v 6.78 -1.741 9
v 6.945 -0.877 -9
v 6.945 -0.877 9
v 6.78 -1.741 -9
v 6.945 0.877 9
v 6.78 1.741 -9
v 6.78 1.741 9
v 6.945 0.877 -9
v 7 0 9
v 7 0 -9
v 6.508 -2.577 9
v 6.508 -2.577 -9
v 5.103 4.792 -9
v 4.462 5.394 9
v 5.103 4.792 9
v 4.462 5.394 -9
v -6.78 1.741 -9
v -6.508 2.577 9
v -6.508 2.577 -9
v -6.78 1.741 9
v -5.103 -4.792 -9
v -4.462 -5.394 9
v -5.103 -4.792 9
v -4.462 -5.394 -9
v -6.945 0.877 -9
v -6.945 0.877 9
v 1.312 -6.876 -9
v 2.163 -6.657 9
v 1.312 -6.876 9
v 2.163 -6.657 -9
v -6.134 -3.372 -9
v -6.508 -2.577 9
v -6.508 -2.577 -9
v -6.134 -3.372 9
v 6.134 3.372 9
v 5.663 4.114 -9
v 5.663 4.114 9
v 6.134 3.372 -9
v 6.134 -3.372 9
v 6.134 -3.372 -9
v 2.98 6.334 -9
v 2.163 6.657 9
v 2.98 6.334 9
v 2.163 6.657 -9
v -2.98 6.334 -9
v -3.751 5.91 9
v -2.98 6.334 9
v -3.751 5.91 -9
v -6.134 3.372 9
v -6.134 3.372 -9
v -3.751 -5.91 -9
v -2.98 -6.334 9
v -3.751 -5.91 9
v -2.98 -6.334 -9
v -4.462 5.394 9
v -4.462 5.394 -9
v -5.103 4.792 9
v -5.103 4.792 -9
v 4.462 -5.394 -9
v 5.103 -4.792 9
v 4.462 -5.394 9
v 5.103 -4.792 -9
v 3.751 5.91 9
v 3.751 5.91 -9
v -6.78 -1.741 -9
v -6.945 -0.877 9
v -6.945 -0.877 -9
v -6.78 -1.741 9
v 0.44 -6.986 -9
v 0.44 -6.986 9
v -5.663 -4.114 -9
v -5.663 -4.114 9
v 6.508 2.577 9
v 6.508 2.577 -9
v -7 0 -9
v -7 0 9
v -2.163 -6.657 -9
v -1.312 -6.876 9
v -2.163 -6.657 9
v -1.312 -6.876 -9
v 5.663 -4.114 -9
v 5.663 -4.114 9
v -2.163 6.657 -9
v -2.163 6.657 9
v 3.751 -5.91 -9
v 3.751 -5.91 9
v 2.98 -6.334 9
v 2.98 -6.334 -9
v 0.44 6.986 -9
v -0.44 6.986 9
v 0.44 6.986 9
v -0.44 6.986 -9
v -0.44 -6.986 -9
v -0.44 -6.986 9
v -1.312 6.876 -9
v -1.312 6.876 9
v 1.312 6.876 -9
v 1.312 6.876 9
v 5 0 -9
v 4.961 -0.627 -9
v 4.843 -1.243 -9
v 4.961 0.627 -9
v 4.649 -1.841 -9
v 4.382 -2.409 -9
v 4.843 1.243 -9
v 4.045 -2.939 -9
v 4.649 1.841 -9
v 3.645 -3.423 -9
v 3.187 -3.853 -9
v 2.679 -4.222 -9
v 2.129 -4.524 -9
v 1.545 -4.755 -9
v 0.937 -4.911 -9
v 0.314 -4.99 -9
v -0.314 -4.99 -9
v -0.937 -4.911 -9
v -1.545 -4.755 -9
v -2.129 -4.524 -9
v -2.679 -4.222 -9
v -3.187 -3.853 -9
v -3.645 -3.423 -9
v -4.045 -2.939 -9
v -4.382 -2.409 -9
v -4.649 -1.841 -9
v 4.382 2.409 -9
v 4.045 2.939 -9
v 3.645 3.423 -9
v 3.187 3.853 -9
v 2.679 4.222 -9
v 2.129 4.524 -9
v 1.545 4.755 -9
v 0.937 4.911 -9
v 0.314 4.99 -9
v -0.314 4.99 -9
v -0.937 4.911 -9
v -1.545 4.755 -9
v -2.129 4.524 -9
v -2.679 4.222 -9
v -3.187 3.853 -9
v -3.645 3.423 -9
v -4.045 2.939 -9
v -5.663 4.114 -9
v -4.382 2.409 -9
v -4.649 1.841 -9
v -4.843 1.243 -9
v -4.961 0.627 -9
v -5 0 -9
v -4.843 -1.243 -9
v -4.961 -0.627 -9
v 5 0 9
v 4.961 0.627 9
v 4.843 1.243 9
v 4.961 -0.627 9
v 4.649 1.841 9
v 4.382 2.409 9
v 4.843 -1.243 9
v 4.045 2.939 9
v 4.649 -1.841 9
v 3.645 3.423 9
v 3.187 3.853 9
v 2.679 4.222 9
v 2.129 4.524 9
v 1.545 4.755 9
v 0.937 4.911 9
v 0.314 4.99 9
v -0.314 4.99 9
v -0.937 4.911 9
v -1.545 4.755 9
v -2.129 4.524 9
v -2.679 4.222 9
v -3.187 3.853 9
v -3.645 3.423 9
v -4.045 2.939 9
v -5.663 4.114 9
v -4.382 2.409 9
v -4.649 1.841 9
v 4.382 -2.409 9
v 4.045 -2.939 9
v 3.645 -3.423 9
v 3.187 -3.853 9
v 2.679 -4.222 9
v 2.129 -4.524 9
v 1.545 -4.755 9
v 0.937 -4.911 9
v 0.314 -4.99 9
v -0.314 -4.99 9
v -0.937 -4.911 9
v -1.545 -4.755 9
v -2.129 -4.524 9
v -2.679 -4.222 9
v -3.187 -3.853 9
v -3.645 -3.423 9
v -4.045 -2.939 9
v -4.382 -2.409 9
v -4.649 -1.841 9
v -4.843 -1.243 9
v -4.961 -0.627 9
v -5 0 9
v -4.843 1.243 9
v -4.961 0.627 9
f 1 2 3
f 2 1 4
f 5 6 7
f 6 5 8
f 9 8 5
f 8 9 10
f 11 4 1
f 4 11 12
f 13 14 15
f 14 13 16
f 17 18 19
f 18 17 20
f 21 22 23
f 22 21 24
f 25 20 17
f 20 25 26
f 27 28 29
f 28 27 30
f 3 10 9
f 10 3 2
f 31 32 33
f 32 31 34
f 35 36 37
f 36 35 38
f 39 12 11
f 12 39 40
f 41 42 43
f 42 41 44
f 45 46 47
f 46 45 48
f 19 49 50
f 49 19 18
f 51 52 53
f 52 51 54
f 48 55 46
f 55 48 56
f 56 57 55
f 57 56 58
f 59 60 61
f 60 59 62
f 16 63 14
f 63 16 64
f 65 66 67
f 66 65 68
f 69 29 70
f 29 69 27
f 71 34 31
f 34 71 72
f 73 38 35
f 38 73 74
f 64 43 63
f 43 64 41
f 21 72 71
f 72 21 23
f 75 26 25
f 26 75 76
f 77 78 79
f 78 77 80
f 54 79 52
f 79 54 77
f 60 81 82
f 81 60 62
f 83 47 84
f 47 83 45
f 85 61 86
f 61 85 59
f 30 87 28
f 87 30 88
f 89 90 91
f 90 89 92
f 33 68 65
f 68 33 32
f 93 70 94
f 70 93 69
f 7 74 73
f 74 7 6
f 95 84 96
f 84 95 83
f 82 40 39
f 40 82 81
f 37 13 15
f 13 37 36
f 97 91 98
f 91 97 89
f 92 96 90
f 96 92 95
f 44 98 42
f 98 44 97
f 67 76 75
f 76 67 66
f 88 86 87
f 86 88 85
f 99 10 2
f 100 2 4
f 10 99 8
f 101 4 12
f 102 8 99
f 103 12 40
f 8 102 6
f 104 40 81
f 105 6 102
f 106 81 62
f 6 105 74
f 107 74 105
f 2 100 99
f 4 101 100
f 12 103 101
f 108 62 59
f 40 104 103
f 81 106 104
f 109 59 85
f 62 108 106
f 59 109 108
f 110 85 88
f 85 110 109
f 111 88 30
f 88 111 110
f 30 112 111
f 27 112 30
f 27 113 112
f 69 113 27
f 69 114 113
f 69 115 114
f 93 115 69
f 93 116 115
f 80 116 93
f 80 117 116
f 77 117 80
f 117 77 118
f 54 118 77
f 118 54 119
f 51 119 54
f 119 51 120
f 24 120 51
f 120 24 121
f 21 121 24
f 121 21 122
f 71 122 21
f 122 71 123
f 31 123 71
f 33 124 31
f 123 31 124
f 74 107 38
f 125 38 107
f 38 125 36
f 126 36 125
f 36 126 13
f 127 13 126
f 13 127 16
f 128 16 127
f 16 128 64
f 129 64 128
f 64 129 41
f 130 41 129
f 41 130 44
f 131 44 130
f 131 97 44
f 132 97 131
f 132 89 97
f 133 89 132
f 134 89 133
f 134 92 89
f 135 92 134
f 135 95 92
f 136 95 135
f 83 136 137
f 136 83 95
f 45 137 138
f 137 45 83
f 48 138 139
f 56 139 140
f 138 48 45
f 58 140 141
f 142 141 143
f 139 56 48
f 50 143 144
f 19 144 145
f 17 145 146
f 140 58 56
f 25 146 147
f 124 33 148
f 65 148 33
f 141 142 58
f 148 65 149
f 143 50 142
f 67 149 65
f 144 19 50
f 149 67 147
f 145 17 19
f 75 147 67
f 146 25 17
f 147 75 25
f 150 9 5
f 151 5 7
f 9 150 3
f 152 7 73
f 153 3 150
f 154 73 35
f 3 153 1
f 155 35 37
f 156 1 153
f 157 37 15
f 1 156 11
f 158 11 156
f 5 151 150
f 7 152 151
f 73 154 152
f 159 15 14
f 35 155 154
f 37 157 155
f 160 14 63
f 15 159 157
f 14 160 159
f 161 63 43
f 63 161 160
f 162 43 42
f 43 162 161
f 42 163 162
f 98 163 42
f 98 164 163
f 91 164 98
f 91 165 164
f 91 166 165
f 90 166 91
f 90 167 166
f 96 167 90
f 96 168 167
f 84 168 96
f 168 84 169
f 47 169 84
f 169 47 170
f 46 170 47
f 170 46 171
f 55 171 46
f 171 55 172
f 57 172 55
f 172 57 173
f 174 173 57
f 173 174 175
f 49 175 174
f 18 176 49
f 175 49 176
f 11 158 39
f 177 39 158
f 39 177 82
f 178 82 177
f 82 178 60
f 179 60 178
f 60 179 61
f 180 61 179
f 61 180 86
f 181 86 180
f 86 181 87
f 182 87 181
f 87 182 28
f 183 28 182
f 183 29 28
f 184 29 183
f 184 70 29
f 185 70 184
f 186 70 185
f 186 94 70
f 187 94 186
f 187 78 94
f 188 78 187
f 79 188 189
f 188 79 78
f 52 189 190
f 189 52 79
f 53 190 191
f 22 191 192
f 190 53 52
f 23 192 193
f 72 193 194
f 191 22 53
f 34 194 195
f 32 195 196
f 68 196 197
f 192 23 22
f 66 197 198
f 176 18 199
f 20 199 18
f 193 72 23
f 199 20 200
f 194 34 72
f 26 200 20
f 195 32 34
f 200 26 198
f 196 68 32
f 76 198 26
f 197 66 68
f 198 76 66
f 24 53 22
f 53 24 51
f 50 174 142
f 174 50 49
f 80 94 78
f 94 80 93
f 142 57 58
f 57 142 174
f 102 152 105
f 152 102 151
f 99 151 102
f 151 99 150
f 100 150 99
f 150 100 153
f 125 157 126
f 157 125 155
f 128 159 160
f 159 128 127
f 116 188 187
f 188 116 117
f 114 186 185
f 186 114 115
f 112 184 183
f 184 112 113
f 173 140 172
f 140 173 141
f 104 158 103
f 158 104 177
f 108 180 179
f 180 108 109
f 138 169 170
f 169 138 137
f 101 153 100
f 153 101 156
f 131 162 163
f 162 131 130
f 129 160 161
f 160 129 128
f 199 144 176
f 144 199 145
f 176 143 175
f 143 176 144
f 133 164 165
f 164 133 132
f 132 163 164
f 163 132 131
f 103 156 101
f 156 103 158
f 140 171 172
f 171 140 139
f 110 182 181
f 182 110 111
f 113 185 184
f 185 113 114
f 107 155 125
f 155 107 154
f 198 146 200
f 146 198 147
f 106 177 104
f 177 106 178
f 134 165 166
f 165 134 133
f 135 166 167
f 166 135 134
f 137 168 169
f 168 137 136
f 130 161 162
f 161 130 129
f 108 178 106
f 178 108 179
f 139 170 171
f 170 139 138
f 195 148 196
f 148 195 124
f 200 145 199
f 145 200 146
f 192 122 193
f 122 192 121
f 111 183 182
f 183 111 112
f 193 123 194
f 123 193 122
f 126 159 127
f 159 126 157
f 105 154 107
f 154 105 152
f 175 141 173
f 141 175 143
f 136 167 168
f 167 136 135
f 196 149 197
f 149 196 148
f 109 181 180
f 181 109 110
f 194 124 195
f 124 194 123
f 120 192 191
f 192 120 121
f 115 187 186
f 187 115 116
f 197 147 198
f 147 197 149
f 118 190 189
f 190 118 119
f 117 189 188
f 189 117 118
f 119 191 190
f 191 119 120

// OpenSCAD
$fn = 50;


difference() {
	union() {
		translate(v = [0, 0, -9.0000000000]) {
			cylinder(h = 18, r = 7.0000000000);
		}
	}
	union() {
		translate(v = [0, 0, -100.0000000000]) {
			cylinder(h = 200, r = 5.0000000000);
		}
	}
}
